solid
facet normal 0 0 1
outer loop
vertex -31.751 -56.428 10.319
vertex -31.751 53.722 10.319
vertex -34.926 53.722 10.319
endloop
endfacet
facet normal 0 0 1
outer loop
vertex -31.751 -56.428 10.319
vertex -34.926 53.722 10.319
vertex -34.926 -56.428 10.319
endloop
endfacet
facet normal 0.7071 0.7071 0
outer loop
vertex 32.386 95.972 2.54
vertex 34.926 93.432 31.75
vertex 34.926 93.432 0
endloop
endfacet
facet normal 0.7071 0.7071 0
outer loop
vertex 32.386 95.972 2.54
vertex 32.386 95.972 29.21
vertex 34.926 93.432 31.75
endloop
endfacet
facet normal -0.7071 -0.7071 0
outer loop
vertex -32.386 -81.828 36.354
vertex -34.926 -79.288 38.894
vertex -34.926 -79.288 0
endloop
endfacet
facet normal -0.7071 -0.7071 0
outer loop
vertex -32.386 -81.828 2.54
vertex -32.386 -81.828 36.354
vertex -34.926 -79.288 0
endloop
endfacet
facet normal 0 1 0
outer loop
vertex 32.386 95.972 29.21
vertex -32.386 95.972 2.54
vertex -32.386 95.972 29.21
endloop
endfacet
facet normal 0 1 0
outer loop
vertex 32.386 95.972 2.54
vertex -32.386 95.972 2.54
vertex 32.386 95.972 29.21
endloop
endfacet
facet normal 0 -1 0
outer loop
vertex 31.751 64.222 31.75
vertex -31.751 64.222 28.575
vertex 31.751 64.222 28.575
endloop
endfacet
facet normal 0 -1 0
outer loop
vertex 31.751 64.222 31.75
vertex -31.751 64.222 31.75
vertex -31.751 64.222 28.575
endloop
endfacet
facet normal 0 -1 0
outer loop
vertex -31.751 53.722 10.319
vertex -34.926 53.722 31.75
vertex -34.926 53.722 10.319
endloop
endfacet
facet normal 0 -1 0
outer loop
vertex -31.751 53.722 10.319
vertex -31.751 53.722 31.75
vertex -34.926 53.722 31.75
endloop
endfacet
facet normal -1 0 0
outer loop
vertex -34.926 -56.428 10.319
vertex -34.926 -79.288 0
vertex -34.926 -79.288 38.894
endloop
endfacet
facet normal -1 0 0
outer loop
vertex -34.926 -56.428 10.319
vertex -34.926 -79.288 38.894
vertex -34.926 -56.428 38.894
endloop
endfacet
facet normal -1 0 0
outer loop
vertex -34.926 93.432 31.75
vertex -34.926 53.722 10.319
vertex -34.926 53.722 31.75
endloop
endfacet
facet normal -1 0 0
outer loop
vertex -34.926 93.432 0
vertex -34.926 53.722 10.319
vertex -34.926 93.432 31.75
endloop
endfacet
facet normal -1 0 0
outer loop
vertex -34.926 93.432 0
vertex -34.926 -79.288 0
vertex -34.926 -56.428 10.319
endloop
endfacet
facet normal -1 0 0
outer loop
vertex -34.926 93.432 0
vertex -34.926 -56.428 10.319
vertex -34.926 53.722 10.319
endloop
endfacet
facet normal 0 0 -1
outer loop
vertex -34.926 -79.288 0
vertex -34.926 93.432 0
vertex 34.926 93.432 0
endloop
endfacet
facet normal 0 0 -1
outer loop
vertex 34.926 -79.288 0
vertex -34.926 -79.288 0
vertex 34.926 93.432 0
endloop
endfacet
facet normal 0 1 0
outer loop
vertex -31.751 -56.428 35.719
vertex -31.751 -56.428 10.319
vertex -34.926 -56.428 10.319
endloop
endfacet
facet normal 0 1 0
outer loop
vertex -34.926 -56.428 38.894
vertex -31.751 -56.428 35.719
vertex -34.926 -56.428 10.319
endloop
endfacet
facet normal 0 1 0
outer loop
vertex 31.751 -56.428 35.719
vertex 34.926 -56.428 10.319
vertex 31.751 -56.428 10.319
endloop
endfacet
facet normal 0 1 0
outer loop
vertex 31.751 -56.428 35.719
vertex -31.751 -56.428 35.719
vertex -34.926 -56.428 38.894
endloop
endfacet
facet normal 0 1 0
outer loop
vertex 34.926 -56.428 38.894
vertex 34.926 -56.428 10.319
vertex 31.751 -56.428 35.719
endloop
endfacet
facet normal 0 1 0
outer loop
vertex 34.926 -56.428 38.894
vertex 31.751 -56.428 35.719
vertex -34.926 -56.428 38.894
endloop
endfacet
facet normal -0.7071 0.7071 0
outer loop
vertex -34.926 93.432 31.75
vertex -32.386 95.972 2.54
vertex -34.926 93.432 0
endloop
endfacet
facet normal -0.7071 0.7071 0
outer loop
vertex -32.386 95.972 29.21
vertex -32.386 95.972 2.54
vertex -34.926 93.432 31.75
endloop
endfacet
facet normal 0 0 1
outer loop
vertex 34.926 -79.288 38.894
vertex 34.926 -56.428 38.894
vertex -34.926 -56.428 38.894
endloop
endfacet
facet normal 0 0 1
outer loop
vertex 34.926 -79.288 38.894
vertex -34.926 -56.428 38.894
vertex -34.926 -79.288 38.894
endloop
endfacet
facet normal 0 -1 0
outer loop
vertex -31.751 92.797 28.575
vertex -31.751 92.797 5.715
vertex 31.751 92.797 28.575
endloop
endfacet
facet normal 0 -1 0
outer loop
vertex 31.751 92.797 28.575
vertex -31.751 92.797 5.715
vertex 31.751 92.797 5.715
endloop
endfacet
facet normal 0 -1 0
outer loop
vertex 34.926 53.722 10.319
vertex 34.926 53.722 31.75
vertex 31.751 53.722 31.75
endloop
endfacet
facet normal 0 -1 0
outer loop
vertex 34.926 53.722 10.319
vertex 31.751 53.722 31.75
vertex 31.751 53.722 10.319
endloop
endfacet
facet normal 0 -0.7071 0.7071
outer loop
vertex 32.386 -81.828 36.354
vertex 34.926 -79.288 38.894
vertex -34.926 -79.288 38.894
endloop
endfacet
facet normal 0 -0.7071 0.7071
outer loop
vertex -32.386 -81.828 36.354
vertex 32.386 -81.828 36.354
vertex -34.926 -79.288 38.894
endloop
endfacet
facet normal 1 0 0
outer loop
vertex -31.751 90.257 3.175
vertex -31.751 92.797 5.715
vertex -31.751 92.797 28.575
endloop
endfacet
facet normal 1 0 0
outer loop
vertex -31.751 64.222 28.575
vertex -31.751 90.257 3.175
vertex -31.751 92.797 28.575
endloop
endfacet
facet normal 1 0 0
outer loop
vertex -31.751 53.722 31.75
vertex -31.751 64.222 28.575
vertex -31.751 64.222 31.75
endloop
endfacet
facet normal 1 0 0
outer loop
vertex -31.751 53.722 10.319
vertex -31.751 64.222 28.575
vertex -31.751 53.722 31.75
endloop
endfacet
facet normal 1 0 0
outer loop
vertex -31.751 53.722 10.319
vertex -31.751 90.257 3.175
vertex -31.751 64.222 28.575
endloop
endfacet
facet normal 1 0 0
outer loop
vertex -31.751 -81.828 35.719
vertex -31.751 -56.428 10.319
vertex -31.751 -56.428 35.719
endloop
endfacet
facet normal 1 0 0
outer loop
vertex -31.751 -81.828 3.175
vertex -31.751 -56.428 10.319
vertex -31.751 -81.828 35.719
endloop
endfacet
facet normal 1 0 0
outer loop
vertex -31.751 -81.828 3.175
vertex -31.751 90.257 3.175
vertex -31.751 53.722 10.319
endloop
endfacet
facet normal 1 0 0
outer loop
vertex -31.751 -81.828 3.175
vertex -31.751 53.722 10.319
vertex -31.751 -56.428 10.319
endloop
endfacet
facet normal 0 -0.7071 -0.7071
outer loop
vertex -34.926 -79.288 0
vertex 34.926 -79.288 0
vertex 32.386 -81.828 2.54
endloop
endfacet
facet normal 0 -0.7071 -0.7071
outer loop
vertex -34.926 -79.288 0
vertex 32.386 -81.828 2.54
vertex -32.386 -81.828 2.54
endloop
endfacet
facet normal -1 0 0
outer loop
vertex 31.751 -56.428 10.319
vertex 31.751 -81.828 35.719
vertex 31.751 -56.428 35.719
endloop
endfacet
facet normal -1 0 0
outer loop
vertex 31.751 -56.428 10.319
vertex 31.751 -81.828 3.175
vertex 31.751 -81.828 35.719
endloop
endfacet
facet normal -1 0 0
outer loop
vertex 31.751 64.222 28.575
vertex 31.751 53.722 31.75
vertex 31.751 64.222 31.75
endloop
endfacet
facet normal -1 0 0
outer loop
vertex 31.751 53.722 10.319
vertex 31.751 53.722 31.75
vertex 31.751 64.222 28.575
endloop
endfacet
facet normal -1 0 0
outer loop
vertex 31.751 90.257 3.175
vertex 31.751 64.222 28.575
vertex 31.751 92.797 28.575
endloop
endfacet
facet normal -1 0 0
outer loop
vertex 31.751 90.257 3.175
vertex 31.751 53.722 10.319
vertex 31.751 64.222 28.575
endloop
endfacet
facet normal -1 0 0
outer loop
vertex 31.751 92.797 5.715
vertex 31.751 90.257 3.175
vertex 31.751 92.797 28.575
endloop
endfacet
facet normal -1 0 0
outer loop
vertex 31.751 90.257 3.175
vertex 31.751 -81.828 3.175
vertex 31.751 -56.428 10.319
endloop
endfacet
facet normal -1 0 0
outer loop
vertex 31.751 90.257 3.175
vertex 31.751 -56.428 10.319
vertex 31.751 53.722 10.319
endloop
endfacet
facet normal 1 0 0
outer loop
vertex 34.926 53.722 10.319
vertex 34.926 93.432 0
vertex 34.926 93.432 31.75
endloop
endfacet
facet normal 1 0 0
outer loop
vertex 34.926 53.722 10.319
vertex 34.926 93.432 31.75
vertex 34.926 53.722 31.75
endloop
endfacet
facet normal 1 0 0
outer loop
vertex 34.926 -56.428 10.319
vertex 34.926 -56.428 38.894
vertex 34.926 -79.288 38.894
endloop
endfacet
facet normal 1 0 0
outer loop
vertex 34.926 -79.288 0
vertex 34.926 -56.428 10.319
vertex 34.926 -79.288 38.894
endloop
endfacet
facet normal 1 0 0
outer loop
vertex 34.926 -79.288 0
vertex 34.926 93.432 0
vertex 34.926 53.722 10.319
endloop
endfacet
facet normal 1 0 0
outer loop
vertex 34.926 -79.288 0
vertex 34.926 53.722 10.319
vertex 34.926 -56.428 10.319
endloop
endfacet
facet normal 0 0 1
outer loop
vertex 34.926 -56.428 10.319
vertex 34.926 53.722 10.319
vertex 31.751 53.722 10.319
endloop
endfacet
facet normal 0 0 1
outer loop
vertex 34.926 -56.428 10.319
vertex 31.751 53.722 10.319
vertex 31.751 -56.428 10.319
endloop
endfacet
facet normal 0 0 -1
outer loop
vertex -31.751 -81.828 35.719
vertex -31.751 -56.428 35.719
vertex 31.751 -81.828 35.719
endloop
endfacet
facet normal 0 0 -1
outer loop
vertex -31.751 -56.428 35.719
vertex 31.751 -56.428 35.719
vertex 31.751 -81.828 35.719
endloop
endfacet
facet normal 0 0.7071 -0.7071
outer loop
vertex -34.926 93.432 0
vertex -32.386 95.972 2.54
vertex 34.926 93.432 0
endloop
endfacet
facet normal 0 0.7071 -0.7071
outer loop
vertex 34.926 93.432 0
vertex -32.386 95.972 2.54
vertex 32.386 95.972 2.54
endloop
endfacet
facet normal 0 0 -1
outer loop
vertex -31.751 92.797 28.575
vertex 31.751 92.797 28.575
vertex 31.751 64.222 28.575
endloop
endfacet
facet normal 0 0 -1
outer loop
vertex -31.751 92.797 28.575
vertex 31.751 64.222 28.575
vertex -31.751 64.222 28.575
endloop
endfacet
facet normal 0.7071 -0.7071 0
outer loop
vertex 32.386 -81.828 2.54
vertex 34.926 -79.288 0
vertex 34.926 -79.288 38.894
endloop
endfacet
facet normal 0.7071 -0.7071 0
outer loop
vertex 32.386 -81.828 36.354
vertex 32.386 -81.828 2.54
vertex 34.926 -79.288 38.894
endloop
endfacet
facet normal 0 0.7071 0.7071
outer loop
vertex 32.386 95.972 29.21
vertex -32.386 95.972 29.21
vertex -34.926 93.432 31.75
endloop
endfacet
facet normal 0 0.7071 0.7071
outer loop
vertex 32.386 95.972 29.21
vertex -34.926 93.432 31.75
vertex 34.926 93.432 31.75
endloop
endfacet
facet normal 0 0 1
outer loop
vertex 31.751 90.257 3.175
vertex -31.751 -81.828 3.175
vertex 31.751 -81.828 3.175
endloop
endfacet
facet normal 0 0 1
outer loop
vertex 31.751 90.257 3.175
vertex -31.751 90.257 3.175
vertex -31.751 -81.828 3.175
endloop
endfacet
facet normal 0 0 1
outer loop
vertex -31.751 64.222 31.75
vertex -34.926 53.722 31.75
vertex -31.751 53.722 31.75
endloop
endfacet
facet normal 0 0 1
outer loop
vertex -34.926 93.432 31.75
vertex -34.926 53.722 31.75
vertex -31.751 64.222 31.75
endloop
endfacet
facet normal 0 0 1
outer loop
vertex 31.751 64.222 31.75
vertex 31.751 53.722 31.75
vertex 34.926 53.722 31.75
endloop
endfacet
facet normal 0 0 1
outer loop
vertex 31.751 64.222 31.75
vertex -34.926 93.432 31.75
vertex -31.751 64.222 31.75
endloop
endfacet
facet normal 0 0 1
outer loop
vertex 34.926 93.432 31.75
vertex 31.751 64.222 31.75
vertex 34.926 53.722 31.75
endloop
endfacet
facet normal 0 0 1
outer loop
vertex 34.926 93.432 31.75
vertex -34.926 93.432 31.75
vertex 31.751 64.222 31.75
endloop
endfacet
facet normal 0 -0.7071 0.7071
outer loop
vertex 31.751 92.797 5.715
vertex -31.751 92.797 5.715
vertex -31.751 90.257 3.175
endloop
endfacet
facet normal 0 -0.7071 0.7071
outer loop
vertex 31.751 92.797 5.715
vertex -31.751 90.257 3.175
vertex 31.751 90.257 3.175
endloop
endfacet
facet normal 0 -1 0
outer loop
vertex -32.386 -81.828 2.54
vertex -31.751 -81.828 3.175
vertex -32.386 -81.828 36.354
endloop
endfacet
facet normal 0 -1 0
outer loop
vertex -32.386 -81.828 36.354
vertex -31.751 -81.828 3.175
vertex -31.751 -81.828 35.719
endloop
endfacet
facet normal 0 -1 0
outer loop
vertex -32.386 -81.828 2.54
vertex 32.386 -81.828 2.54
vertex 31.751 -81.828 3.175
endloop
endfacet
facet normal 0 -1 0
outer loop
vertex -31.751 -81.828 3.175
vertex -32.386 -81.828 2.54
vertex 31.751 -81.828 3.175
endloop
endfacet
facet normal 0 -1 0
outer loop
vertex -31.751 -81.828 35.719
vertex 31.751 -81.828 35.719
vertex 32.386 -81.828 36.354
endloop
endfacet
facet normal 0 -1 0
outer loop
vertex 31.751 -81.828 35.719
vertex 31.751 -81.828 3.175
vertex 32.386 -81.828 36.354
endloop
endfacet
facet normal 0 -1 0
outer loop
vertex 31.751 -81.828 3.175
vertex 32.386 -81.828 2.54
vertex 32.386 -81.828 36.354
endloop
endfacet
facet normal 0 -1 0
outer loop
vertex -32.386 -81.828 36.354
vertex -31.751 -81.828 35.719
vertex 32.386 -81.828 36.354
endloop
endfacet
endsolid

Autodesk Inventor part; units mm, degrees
ref_plane "YZ Plane" through (0, 0, 0) normal (1, 0, 0) x (0, 1, 0)
ref_plane "XZ Plane" through (0, 0, 0) normal (0, 1, 0) x (-1, 0, 0)
ref_plane "XY Plane" through (0, 0, 0) normal (0, 0, 1) x (1, 0, 0)
sketch "Sketch1" plane through (0, 0, 0) normal (0, 0, 1) x (1, 0, 0)
  arc A0 (49.1564, -72.9751) -> (-49.1564, -72.9751) centre (0, -254.0664) ccw
  line L0 (49.1564, -72.9751) -> (73.0086, -49.1229)
  line L1 (86.9345, 13.6367) -> (74.7113, 47.4192)
  line L2 (74.7113, 47.4192) -> (49.163, 72.9816)
  line L3 (-49.163, 72.9816) -> (-75.1179, 47.041)
  line L4 (-75.1179, 47.041) -> (-86.9513, 13.6826)
  line L5 (-49.1564, -72.9751) -> (-73.0086, -49.1229)
  arc A1 (-49.163, 72.9816) -> (49.163, 72.9816) centre (0, 254.0664) ccw
  arc A2 (-73.0086, -49.1229) -> (-86.9513, 13.6826) centre (-146.4572, -32.478) ccw
  arc A3 (86.9345, 13.6367) -> (73.0086, -49.1229) centre (146.4645, -32.4974) ccw
  line L6 (0, 0) -> (0, -66.422)
  line L7 (0, 0) -> (0, 66.4266)
  line L8 (78.5091, -0.0284) -> (-78.4957, -0.0284)
  line L9 (-49.163, 72.9816) -> (49.163, 72.9816)
  line L10 (-49.163, 72.9816) -> (-31.7513, 72.9816)
  line L11 (-31.7513, 72.9816) -> (-31.7513, -69.1278)
  line L12 (49.163, 72.9816) -> (31.7513, 72.9816)
  line L13 (31.7513, 72.9816) -> (31.7513, -69.1278)
  line L14 (31.7513, -69.1278) -> (31.7513, 95.9722)
  line L15 (31.7513, 95.9722) -> (-31.7513, 95.9722)
  line L16 (-31.7513, 95.9722) -> (-31.7513, 72.9816)
  line L17 (31.7513, -69.1278) -> (31.7513, -81.8278)
  line L18 (31.7513, -81.8278) -> (-31.7513, -81.8278)
  line L19 (-31.7513, -81.8278) -> (-31.7513, -69.1278)
  line L20 (31.7513, 95.9722) -> (34.9263, 95.9722)
  line L21 (34.9263, 95.9722) -> (34.9263, -81.8278)
  line L22 (34.9263, -81.8278) -> (31.7513, -81.8278)
  line L23 (-31.7513, 95.9722) -> (-34.9263, 95.9722)
  line L24 (-34.9263, 95.9722) -> (-34.9263, -81.8278)
  line L25 (-34.9263, -81.8278) -> (-31.7513, -81.8278)
  line L26 (31.7513, 95.9722) -> (31.7513, 92.7972)
  line L27 (31.7513, 92.7972) -> (-31.7513, 92.7972)
extrude "Extrusion1" add sketch "Sketch1" along normal blind 3.175 contours L17 L18 L19 A0 | L13 L8 L21 A0 | A0 L6 L8 L13 | A0 L21 L22 L17 | A0 L11 L8 L6 | L13 A1 L21 L8 | L8 L6 L7 A1 L13 | L19 L25 L24 A0 | A0 L24 L8 L11 | L8 L11 A1 L7 L6 | L13 L9 L21 A1 | A1 L11 L9 L13 | L8 L24 A1 L11 | L14 L20 L21 L9 | L9 L16 L27 L14 | A1 L24 L9 L11 | L9 L24 L23 L16 | L27 L16 L15 L14
sketch "Sketch2" plane through (0, 0, 3.175) normal (0, 0, 1) x (1, 0, 0)
  line L0 (34.9263, 95.9722) -> (-34.9263, 95.9722) projected
  line L1 (-34.9263, 95.9722) -> (-34.9263, -81.8278) projected
  line L2 (-34.9263, -81.8278) -> (34.9263, -81.8278) projected
  line L3 (34.9263, -81.8278) -> (34.9263, 95.9722) projected
  line L4 (-34.9263, 95.9722) -> (-34.9263, 92.7972)
  line L5 (-34.9263, 92.7972) -> (34.9263, 92.7972)
  line L6 (34.9263, -81.8278) -> (31.7513, -81.8278)
  line L7 (31.7513, -81.8278) -> (31.7513, 92.7972)
  line L8 (-34.9263, -81.8278) -> (-31.7513, -81.8278)
  line L9 (-31.7513, -81.8278) -> (-31.7513, 92.7972)
  point P0 (0, 0)
  dimension "d9" = 3.175
  dimension "d10" = 3.175
  dimension "d11" = 3.175
extrude "Extrusion2" add sketch "Sketch2" along normal blind 28.575 contours L3 L5 L1 L0 | L3 L2 L7 L5 | L5 L9 L2 L1
sketch "Sketch3" plane through (-31.7513, 92.7972, 3.175) normal (0, -1, 0) x (1, 0, 0)
  line L0 (63.5025, 0) -> (63.5025, 28.575) projected
  line L1 (0, 28.575) -> (63.5025, 28.575) projected
  line L2 (0, 28.575) -> (0, 0) projected
  line L3 (63.5025, 28.575) -> (63.5025, 25.4)
  line L4 (63.5025, 25.4) -> (0, 25.4)
  point P0 (31.7513, -3.175)
  dimension "d14" = 3.175
extrude "Extrusion3" add sketch "Sketch3" along normal blind 28.575
sketch "Sketch4" plane through (34.9263, -81.8278, 0) normal (1, 0, 0) x (0, 0, -1)
  line L0 (-31.75, 0) -> (-31.75, 177.8) projected
  line L1 (0, 0) -> (-31.75, 0) projected
  line L2 (-31.75, 0) -> (-31.75, 135.5494)
  line L3 (-31.75, 135.5494) -> (-10.3194, 135.5494)
  line L4 (-10.3194, 135.5494) -> (-10.3194, 0)
  point P0 (0, 81.8278)
extrude "Extrusion4" cut sketch "Sketch4" against normal blind 127
sketch "Sketch5" plane through (34.9263, -81.8278, 10.3194) normal (0, 0, 1) x (1, 0, 0)
  line L0 (-3.175, 0) -> (-3.175, 135.5494) projected
  line L1 (0, 0) -> (-3.175, 0) projected
  line L2 (0, 135.5494) -> (0, 0) projected
  line L3 (0, 0) -> (0, 25.4)
  line L4 (0, 25.4) -> (-3.175, 25.4)
  point P0 (-34.9263, 81.8278)
  dimension "d19" = 25.4
sketch "Sketch6" plane through (-34.9263, 53.7216, 10.3194) normal (0, 0, 1) x (1, 0, 0)
  line L0 (3.175, 0) -> (3.175, -135.5494) projected
  line L1 (0, -135.5494) -> (0, 0) projected
  line L2 (3.175, -135.5494) -> (0, -135.5494) projected
  line L3 (3.175, -135.5494) -> (3.175, -110.1494)
  line L4 (3.175, -110.1494) -> (0, -110.1494)
  point P0 (34.9263, -53.7216)
  dimension "d20" = 25.4
extrude "Extrusion5" add sketch "Sketch6" along normal blind 28.575
extrude "Extrusion6" add sketch "Sketch5" along normal blind 28.575
sketch "Sketch7" plane through (31.7513, -81.8278, 3.175) normal (-1, 0, 0) x (0, 0, 1)
  line L0 (0, 0) -> (35.7194, 0) projected
  line L1 (35.7194, 25.4) -> (35.7194, 0) projected
  line L2 (7.1444, 25.4) -> (35.7194, 25.4) projected
  line L3 (35.7194, 25.4) -> (32.5444, 25.4)
  line L4 (32.5444, 25.4) -> (32.5444, 0)
  point P0 (-3.175, 81.8278)
  dimension "d25" = 3.175
extrude "Extrusion7" add sketch "Sketch7" along normal blind 66.04
chamfer "Chamfer1" distance 2.54 angle 45 5 edges at (0, 95.9722, 31.75) (-34.9263, 95.9722, 15.875) (0, 92.7972, 3.175) (34.9263, 95.9722, 15.875) (0, 95.9722, 0)
chamfer "Chamfer2" distance 2.54 angle 45 4 edges at (0, -81.8278, 38.8944) (0, -81.8278, 0) (-34.9263, -81.8278, 19.4472) (34.9263, -81.8278, 19.4472)
properties part number "Battery Holder"
